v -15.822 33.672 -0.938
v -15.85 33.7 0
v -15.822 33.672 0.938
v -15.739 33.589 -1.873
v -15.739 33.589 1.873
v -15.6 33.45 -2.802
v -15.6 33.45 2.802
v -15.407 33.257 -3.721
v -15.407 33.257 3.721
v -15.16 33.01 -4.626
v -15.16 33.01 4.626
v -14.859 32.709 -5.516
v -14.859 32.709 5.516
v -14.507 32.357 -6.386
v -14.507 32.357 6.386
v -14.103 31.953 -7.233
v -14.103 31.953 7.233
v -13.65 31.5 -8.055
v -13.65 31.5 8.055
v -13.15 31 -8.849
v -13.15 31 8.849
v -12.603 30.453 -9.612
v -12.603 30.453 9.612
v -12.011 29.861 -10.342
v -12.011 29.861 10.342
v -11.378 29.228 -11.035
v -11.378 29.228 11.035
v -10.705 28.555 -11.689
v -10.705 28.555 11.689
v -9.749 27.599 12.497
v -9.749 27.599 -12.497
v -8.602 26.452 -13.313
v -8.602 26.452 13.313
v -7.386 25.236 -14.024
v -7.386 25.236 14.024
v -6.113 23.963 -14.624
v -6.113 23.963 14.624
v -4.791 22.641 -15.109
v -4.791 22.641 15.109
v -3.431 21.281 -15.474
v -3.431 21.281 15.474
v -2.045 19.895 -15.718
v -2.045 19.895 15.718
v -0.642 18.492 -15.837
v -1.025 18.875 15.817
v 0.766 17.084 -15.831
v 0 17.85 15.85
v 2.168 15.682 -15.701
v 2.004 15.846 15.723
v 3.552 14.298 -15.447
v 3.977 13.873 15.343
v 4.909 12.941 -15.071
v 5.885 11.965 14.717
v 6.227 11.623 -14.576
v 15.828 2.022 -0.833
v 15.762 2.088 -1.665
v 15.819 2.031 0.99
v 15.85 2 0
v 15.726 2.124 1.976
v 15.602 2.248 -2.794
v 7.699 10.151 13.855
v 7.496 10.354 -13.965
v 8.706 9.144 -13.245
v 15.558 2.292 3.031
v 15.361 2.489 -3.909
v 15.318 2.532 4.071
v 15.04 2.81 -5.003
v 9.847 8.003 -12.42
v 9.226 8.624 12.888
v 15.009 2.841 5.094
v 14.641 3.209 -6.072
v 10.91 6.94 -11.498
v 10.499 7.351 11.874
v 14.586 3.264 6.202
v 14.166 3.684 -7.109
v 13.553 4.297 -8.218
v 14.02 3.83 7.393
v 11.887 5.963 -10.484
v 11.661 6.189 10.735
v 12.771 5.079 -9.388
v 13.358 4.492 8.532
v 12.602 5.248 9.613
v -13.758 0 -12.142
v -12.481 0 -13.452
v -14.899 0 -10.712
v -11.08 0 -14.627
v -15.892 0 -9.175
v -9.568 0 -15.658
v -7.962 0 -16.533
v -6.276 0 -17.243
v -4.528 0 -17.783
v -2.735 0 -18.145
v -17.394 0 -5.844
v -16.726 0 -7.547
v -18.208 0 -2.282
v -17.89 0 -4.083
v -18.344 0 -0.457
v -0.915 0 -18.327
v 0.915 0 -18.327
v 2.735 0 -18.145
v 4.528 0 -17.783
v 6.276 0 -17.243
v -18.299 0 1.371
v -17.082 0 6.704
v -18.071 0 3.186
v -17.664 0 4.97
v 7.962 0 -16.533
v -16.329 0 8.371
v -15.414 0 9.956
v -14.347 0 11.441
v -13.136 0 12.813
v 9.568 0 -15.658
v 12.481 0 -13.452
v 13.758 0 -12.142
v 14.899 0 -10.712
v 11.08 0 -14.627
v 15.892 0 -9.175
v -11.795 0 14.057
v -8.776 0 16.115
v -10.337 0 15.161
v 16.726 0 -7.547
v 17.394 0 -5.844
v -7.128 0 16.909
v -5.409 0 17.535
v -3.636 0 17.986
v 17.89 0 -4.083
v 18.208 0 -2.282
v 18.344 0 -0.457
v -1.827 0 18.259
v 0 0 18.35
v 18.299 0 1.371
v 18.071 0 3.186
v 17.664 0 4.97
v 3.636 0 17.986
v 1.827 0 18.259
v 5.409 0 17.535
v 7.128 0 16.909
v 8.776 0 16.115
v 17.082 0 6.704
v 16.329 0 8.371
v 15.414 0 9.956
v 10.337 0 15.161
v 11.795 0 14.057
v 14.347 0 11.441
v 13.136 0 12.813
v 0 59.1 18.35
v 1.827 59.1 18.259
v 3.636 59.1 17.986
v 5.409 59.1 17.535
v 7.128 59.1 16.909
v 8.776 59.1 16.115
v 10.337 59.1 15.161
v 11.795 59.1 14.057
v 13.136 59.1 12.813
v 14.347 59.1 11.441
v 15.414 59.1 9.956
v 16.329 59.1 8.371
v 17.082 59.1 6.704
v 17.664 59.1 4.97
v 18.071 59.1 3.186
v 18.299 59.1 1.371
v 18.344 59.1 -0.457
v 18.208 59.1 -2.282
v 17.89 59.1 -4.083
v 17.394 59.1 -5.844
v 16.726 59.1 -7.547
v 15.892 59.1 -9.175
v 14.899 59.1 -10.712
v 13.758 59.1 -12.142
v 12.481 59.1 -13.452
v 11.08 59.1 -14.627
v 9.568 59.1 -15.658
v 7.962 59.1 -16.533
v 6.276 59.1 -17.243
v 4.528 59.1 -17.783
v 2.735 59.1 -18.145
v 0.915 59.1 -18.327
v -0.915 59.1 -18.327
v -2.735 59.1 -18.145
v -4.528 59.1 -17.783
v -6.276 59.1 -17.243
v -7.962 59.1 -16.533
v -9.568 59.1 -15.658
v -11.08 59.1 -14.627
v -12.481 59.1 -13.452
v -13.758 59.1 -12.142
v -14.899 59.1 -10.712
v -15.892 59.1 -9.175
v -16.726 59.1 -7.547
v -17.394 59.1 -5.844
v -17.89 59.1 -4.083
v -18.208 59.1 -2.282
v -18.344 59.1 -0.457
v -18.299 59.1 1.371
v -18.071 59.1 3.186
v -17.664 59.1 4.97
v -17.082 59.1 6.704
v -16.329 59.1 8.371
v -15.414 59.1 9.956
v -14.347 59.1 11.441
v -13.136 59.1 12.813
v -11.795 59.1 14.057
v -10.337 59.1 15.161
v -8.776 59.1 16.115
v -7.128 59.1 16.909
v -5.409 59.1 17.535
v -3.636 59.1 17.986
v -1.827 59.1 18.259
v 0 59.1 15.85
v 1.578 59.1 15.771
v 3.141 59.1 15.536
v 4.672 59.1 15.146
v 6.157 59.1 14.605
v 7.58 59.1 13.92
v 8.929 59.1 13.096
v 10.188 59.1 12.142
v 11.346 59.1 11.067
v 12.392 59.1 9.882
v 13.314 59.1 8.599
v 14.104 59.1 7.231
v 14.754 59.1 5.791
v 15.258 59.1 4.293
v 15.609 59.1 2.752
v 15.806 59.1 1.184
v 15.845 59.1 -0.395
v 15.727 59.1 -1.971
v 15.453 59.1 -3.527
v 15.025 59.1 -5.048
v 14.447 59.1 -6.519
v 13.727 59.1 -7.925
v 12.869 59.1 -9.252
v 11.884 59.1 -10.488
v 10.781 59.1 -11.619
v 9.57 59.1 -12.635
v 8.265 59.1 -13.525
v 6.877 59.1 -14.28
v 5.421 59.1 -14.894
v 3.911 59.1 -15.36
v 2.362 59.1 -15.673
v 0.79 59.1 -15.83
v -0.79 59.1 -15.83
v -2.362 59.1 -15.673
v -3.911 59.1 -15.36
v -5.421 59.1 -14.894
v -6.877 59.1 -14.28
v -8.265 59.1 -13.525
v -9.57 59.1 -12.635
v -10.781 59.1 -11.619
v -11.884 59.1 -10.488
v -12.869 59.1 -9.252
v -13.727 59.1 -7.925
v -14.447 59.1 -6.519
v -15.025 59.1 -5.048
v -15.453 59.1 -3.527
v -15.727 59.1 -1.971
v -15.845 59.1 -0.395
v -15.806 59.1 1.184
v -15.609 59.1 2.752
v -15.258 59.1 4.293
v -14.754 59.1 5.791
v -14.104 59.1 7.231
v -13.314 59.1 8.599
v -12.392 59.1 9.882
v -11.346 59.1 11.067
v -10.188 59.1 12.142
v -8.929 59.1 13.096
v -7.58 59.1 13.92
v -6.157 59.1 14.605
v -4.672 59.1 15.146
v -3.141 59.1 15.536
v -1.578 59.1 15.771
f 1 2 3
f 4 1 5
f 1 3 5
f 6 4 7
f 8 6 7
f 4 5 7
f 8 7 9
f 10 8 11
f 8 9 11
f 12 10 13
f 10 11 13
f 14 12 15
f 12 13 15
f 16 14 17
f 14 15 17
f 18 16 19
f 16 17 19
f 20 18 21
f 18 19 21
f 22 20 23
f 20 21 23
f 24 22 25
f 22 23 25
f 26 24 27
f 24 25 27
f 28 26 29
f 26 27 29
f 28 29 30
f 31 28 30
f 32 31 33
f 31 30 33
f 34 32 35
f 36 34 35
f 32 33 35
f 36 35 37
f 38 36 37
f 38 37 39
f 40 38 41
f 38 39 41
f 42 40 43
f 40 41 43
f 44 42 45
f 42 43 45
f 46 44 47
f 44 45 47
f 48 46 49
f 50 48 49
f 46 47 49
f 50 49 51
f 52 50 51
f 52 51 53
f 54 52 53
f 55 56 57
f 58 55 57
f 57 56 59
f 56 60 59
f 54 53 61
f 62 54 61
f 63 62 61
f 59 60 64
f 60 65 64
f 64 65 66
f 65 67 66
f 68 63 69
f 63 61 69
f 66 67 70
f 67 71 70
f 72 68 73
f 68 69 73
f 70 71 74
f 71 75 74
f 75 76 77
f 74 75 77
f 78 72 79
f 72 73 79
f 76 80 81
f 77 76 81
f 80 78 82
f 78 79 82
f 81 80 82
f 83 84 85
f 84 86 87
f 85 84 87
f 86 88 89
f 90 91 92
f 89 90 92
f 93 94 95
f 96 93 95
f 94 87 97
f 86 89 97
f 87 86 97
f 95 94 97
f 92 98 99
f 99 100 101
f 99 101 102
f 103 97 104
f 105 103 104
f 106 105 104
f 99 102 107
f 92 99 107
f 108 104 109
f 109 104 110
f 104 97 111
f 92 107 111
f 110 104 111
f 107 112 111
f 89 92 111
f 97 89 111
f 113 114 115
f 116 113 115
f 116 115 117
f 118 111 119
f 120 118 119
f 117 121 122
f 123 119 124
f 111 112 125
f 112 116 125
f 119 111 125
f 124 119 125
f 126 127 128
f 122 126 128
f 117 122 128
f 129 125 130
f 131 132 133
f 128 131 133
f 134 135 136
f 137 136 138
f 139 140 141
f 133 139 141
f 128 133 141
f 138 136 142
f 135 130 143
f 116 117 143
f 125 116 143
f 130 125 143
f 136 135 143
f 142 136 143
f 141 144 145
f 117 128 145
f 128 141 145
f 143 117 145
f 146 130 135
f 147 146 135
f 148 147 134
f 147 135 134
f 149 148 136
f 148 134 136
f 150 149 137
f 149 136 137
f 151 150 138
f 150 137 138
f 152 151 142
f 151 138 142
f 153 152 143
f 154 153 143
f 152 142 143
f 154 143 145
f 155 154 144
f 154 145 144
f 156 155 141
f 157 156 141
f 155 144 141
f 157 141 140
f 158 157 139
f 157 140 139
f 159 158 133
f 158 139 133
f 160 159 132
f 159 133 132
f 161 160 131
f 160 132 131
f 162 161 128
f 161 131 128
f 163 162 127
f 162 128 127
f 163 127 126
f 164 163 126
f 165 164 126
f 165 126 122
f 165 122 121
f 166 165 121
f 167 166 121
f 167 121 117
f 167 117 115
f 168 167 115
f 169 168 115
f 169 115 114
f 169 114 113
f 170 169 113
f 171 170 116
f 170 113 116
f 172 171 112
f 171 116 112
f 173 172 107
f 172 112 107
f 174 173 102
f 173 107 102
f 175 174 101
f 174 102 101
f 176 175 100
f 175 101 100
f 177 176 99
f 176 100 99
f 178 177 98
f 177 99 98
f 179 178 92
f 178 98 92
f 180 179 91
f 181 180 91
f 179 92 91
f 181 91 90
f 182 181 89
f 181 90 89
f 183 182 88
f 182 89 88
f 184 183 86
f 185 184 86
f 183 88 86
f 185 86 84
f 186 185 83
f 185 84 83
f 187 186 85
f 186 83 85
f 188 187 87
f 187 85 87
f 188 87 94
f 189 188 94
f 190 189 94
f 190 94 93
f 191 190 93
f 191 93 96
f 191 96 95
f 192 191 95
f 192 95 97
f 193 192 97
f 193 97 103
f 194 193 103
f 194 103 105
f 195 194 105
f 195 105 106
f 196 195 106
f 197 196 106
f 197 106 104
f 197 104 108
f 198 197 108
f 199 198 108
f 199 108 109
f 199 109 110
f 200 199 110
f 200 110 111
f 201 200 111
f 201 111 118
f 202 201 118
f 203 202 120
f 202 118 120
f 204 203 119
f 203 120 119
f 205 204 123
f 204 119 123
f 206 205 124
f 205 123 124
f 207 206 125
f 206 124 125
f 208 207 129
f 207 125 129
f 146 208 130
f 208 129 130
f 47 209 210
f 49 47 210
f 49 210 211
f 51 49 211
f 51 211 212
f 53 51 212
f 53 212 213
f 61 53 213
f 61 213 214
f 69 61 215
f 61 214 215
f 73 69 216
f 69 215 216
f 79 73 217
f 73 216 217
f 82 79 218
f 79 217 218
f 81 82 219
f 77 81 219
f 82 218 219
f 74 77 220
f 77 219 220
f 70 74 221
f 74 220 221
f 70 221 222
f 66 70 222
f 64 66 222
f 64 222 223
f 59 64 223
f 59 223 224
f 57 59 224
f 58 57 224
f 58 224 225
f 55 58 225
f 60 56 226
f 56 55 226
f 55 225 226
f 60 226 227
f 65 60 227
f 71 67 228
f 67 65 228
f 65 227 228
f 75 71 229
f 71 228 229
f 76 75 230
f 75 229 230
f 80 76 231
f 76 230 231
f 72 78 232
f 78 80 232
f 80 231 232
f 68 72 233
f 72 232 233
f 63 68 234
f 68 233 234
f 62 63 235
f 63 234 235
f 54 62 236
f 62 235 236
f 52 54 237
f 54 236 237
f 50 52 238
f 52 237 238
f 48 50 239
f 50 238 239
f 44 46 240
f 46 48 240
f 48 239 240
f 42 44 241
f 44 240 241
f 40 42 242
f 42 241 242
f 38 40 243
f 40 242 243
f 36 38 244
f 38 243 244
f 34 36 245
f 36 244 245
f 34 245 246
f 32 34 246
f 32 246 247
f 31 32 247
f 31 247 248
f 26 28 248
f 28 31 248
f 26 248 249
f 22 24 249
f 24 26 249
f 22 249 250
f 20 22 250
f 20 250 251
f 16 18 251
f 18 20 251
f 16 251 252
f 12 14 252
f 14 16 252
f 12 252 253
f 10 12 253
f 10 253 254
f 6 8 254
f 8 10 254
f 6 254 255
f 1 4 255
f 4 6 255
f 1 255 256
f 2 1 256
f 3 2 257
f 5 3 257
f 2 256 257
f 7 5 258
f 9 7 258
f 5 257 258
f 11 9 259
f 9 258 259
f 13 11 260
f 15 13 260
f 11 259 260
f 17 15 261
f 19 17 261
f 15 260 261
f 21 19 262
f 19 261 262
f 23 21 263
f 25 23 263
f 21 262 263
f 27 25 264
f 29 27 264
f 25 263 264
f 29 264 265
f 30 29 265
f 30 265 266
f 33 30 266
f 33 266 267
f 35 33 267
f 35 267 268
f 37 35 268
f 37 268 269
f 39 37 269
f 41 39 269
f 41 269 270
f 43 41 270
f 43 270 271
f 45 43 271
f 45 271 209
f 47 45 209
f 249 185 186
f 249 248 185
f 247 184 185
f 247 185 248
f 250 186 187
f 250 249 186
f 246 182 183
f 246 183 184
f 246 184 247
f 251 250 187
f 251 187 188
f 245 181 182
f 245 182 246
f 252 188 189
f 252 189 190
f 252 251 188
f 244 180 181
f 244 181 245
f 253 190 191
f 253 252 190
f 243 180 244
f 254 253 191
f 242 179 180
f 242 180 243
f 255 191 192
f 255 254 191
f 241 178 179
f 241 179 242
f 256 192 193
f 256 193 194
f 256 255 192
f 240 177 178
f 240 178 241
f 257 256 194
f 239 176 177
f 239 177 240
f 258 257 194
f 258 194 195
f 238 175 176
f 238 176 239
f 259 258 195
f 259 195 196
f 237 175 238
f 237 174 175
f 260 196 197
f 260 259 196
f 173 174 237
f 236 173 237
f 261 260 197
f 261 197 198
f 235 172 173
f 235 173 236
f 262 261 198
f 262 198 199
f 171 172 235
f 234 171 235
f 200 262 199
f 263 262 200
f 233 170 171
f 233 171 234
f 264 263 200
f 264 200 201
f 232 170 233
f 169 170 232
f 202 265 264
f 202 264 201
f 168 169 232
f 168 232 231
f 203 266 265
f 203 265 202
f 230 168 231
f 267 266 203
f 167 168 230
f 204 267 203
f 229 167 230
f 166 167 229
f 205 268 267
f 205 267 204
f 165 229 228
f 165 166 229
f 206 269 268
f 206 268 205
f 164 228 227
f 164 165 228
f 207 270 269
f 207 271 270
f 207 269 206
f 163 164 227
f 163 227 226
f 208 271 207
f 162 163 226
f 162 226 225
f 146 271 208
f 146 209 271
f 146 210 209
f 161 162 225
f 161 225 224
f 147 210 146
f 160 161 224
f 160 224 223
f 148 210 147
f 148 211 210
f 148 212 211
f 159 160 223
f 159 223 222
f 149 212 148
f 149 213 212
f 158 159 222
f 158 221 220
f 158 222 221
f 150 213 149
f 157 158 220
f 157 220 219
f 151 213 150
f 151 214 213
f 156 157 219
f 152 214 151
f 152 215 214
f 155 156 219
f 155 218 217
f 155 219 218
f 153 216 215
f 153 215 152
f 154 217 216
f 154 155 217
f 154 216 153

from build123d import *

# Parameters (mm, degrees)
SKETCH1_R                       = 18.35
BOSS_EXTRUDE1_DEPTH             = 59.1
SKETCH2_R                       = 15.85
CUT_EXTRUDE1_DEPTH              = 57.1
BOSS_EXTRUDE2_REACH             = 66.547
BOSS_EXTRUDE2_DIRECTION_2_REACH = 66.547


with BuildPart() as part:
    # Sketch1 → Boss-Extrude1 (new body)
    with BuildSketch(Plane(origin=(0, 0, 0), x_dir=(1, 0, 0), z_dir=(0, 1, 0))):
        with Locations(Location((0, 0, 0), (0, 0, 270))):
            Circle(SKETCH1_R)
    extrude(amount=BOSS_EXTRUDE1_DEPTH)

    # Sketch2 → Cut-Extrude1 (cut)
    with BuildSketch(Plane(origin=(0, 59.1, 0), x_dir=(1, 0, 0), z_dir=(0, 1, 0))):
        with Locations(Location((0, 0, 0), (0, 0, 270))):
            Circle(SKETCH2_R)
    extrude(amount=-CUT_EXTRUDE1_DEPTH, mode=Mode.SUBTRACT)

    # Sketch3 → Boss-Extrude2 (add, up to next)
    with BuildSketch(Plane.XY, mode=Mode.PRIVATE) as boss_extrude2_sk1:
        Polygon((-15.85, 33.7), (15.85, 2), (-15.85, 2), align=None)
    boss_extrude2_tool1 = extrude(boss_extrude2_sk1.sketch, amount=BOSS_EXTRUDE2_REACH, mode=Mode.PRIVATE) - part.part
    add(boss_extrude2_tool1.solids().sort_by_distance((-5.283333, 12.566667, 0))[0])

    # Sketch3 → Boss-Extrude2 direction 2 (add, up to next)
    with BuildSketch(Plane.XY, mode=Mode.PRIVATE) as boss_extrude2_direction_2_sk1:
        Polygon((-15.85, 33.7), (15.85, 2), (-15.85, 2), align=None)
    boss_extrude2_direction_2_tool1 = extrude(boss_extrude2_direction_2_sk1.sketch, amount=-BOSS_EXTRUDE2_DIRECTION_2_REACH, mode=Mode.PRIVATE) - part.part
    add(boss_extrude2_direction_2_tool1.solids().sort_by_distance((-5.283333, 12.566667, 0))[0])


solid = part.part
